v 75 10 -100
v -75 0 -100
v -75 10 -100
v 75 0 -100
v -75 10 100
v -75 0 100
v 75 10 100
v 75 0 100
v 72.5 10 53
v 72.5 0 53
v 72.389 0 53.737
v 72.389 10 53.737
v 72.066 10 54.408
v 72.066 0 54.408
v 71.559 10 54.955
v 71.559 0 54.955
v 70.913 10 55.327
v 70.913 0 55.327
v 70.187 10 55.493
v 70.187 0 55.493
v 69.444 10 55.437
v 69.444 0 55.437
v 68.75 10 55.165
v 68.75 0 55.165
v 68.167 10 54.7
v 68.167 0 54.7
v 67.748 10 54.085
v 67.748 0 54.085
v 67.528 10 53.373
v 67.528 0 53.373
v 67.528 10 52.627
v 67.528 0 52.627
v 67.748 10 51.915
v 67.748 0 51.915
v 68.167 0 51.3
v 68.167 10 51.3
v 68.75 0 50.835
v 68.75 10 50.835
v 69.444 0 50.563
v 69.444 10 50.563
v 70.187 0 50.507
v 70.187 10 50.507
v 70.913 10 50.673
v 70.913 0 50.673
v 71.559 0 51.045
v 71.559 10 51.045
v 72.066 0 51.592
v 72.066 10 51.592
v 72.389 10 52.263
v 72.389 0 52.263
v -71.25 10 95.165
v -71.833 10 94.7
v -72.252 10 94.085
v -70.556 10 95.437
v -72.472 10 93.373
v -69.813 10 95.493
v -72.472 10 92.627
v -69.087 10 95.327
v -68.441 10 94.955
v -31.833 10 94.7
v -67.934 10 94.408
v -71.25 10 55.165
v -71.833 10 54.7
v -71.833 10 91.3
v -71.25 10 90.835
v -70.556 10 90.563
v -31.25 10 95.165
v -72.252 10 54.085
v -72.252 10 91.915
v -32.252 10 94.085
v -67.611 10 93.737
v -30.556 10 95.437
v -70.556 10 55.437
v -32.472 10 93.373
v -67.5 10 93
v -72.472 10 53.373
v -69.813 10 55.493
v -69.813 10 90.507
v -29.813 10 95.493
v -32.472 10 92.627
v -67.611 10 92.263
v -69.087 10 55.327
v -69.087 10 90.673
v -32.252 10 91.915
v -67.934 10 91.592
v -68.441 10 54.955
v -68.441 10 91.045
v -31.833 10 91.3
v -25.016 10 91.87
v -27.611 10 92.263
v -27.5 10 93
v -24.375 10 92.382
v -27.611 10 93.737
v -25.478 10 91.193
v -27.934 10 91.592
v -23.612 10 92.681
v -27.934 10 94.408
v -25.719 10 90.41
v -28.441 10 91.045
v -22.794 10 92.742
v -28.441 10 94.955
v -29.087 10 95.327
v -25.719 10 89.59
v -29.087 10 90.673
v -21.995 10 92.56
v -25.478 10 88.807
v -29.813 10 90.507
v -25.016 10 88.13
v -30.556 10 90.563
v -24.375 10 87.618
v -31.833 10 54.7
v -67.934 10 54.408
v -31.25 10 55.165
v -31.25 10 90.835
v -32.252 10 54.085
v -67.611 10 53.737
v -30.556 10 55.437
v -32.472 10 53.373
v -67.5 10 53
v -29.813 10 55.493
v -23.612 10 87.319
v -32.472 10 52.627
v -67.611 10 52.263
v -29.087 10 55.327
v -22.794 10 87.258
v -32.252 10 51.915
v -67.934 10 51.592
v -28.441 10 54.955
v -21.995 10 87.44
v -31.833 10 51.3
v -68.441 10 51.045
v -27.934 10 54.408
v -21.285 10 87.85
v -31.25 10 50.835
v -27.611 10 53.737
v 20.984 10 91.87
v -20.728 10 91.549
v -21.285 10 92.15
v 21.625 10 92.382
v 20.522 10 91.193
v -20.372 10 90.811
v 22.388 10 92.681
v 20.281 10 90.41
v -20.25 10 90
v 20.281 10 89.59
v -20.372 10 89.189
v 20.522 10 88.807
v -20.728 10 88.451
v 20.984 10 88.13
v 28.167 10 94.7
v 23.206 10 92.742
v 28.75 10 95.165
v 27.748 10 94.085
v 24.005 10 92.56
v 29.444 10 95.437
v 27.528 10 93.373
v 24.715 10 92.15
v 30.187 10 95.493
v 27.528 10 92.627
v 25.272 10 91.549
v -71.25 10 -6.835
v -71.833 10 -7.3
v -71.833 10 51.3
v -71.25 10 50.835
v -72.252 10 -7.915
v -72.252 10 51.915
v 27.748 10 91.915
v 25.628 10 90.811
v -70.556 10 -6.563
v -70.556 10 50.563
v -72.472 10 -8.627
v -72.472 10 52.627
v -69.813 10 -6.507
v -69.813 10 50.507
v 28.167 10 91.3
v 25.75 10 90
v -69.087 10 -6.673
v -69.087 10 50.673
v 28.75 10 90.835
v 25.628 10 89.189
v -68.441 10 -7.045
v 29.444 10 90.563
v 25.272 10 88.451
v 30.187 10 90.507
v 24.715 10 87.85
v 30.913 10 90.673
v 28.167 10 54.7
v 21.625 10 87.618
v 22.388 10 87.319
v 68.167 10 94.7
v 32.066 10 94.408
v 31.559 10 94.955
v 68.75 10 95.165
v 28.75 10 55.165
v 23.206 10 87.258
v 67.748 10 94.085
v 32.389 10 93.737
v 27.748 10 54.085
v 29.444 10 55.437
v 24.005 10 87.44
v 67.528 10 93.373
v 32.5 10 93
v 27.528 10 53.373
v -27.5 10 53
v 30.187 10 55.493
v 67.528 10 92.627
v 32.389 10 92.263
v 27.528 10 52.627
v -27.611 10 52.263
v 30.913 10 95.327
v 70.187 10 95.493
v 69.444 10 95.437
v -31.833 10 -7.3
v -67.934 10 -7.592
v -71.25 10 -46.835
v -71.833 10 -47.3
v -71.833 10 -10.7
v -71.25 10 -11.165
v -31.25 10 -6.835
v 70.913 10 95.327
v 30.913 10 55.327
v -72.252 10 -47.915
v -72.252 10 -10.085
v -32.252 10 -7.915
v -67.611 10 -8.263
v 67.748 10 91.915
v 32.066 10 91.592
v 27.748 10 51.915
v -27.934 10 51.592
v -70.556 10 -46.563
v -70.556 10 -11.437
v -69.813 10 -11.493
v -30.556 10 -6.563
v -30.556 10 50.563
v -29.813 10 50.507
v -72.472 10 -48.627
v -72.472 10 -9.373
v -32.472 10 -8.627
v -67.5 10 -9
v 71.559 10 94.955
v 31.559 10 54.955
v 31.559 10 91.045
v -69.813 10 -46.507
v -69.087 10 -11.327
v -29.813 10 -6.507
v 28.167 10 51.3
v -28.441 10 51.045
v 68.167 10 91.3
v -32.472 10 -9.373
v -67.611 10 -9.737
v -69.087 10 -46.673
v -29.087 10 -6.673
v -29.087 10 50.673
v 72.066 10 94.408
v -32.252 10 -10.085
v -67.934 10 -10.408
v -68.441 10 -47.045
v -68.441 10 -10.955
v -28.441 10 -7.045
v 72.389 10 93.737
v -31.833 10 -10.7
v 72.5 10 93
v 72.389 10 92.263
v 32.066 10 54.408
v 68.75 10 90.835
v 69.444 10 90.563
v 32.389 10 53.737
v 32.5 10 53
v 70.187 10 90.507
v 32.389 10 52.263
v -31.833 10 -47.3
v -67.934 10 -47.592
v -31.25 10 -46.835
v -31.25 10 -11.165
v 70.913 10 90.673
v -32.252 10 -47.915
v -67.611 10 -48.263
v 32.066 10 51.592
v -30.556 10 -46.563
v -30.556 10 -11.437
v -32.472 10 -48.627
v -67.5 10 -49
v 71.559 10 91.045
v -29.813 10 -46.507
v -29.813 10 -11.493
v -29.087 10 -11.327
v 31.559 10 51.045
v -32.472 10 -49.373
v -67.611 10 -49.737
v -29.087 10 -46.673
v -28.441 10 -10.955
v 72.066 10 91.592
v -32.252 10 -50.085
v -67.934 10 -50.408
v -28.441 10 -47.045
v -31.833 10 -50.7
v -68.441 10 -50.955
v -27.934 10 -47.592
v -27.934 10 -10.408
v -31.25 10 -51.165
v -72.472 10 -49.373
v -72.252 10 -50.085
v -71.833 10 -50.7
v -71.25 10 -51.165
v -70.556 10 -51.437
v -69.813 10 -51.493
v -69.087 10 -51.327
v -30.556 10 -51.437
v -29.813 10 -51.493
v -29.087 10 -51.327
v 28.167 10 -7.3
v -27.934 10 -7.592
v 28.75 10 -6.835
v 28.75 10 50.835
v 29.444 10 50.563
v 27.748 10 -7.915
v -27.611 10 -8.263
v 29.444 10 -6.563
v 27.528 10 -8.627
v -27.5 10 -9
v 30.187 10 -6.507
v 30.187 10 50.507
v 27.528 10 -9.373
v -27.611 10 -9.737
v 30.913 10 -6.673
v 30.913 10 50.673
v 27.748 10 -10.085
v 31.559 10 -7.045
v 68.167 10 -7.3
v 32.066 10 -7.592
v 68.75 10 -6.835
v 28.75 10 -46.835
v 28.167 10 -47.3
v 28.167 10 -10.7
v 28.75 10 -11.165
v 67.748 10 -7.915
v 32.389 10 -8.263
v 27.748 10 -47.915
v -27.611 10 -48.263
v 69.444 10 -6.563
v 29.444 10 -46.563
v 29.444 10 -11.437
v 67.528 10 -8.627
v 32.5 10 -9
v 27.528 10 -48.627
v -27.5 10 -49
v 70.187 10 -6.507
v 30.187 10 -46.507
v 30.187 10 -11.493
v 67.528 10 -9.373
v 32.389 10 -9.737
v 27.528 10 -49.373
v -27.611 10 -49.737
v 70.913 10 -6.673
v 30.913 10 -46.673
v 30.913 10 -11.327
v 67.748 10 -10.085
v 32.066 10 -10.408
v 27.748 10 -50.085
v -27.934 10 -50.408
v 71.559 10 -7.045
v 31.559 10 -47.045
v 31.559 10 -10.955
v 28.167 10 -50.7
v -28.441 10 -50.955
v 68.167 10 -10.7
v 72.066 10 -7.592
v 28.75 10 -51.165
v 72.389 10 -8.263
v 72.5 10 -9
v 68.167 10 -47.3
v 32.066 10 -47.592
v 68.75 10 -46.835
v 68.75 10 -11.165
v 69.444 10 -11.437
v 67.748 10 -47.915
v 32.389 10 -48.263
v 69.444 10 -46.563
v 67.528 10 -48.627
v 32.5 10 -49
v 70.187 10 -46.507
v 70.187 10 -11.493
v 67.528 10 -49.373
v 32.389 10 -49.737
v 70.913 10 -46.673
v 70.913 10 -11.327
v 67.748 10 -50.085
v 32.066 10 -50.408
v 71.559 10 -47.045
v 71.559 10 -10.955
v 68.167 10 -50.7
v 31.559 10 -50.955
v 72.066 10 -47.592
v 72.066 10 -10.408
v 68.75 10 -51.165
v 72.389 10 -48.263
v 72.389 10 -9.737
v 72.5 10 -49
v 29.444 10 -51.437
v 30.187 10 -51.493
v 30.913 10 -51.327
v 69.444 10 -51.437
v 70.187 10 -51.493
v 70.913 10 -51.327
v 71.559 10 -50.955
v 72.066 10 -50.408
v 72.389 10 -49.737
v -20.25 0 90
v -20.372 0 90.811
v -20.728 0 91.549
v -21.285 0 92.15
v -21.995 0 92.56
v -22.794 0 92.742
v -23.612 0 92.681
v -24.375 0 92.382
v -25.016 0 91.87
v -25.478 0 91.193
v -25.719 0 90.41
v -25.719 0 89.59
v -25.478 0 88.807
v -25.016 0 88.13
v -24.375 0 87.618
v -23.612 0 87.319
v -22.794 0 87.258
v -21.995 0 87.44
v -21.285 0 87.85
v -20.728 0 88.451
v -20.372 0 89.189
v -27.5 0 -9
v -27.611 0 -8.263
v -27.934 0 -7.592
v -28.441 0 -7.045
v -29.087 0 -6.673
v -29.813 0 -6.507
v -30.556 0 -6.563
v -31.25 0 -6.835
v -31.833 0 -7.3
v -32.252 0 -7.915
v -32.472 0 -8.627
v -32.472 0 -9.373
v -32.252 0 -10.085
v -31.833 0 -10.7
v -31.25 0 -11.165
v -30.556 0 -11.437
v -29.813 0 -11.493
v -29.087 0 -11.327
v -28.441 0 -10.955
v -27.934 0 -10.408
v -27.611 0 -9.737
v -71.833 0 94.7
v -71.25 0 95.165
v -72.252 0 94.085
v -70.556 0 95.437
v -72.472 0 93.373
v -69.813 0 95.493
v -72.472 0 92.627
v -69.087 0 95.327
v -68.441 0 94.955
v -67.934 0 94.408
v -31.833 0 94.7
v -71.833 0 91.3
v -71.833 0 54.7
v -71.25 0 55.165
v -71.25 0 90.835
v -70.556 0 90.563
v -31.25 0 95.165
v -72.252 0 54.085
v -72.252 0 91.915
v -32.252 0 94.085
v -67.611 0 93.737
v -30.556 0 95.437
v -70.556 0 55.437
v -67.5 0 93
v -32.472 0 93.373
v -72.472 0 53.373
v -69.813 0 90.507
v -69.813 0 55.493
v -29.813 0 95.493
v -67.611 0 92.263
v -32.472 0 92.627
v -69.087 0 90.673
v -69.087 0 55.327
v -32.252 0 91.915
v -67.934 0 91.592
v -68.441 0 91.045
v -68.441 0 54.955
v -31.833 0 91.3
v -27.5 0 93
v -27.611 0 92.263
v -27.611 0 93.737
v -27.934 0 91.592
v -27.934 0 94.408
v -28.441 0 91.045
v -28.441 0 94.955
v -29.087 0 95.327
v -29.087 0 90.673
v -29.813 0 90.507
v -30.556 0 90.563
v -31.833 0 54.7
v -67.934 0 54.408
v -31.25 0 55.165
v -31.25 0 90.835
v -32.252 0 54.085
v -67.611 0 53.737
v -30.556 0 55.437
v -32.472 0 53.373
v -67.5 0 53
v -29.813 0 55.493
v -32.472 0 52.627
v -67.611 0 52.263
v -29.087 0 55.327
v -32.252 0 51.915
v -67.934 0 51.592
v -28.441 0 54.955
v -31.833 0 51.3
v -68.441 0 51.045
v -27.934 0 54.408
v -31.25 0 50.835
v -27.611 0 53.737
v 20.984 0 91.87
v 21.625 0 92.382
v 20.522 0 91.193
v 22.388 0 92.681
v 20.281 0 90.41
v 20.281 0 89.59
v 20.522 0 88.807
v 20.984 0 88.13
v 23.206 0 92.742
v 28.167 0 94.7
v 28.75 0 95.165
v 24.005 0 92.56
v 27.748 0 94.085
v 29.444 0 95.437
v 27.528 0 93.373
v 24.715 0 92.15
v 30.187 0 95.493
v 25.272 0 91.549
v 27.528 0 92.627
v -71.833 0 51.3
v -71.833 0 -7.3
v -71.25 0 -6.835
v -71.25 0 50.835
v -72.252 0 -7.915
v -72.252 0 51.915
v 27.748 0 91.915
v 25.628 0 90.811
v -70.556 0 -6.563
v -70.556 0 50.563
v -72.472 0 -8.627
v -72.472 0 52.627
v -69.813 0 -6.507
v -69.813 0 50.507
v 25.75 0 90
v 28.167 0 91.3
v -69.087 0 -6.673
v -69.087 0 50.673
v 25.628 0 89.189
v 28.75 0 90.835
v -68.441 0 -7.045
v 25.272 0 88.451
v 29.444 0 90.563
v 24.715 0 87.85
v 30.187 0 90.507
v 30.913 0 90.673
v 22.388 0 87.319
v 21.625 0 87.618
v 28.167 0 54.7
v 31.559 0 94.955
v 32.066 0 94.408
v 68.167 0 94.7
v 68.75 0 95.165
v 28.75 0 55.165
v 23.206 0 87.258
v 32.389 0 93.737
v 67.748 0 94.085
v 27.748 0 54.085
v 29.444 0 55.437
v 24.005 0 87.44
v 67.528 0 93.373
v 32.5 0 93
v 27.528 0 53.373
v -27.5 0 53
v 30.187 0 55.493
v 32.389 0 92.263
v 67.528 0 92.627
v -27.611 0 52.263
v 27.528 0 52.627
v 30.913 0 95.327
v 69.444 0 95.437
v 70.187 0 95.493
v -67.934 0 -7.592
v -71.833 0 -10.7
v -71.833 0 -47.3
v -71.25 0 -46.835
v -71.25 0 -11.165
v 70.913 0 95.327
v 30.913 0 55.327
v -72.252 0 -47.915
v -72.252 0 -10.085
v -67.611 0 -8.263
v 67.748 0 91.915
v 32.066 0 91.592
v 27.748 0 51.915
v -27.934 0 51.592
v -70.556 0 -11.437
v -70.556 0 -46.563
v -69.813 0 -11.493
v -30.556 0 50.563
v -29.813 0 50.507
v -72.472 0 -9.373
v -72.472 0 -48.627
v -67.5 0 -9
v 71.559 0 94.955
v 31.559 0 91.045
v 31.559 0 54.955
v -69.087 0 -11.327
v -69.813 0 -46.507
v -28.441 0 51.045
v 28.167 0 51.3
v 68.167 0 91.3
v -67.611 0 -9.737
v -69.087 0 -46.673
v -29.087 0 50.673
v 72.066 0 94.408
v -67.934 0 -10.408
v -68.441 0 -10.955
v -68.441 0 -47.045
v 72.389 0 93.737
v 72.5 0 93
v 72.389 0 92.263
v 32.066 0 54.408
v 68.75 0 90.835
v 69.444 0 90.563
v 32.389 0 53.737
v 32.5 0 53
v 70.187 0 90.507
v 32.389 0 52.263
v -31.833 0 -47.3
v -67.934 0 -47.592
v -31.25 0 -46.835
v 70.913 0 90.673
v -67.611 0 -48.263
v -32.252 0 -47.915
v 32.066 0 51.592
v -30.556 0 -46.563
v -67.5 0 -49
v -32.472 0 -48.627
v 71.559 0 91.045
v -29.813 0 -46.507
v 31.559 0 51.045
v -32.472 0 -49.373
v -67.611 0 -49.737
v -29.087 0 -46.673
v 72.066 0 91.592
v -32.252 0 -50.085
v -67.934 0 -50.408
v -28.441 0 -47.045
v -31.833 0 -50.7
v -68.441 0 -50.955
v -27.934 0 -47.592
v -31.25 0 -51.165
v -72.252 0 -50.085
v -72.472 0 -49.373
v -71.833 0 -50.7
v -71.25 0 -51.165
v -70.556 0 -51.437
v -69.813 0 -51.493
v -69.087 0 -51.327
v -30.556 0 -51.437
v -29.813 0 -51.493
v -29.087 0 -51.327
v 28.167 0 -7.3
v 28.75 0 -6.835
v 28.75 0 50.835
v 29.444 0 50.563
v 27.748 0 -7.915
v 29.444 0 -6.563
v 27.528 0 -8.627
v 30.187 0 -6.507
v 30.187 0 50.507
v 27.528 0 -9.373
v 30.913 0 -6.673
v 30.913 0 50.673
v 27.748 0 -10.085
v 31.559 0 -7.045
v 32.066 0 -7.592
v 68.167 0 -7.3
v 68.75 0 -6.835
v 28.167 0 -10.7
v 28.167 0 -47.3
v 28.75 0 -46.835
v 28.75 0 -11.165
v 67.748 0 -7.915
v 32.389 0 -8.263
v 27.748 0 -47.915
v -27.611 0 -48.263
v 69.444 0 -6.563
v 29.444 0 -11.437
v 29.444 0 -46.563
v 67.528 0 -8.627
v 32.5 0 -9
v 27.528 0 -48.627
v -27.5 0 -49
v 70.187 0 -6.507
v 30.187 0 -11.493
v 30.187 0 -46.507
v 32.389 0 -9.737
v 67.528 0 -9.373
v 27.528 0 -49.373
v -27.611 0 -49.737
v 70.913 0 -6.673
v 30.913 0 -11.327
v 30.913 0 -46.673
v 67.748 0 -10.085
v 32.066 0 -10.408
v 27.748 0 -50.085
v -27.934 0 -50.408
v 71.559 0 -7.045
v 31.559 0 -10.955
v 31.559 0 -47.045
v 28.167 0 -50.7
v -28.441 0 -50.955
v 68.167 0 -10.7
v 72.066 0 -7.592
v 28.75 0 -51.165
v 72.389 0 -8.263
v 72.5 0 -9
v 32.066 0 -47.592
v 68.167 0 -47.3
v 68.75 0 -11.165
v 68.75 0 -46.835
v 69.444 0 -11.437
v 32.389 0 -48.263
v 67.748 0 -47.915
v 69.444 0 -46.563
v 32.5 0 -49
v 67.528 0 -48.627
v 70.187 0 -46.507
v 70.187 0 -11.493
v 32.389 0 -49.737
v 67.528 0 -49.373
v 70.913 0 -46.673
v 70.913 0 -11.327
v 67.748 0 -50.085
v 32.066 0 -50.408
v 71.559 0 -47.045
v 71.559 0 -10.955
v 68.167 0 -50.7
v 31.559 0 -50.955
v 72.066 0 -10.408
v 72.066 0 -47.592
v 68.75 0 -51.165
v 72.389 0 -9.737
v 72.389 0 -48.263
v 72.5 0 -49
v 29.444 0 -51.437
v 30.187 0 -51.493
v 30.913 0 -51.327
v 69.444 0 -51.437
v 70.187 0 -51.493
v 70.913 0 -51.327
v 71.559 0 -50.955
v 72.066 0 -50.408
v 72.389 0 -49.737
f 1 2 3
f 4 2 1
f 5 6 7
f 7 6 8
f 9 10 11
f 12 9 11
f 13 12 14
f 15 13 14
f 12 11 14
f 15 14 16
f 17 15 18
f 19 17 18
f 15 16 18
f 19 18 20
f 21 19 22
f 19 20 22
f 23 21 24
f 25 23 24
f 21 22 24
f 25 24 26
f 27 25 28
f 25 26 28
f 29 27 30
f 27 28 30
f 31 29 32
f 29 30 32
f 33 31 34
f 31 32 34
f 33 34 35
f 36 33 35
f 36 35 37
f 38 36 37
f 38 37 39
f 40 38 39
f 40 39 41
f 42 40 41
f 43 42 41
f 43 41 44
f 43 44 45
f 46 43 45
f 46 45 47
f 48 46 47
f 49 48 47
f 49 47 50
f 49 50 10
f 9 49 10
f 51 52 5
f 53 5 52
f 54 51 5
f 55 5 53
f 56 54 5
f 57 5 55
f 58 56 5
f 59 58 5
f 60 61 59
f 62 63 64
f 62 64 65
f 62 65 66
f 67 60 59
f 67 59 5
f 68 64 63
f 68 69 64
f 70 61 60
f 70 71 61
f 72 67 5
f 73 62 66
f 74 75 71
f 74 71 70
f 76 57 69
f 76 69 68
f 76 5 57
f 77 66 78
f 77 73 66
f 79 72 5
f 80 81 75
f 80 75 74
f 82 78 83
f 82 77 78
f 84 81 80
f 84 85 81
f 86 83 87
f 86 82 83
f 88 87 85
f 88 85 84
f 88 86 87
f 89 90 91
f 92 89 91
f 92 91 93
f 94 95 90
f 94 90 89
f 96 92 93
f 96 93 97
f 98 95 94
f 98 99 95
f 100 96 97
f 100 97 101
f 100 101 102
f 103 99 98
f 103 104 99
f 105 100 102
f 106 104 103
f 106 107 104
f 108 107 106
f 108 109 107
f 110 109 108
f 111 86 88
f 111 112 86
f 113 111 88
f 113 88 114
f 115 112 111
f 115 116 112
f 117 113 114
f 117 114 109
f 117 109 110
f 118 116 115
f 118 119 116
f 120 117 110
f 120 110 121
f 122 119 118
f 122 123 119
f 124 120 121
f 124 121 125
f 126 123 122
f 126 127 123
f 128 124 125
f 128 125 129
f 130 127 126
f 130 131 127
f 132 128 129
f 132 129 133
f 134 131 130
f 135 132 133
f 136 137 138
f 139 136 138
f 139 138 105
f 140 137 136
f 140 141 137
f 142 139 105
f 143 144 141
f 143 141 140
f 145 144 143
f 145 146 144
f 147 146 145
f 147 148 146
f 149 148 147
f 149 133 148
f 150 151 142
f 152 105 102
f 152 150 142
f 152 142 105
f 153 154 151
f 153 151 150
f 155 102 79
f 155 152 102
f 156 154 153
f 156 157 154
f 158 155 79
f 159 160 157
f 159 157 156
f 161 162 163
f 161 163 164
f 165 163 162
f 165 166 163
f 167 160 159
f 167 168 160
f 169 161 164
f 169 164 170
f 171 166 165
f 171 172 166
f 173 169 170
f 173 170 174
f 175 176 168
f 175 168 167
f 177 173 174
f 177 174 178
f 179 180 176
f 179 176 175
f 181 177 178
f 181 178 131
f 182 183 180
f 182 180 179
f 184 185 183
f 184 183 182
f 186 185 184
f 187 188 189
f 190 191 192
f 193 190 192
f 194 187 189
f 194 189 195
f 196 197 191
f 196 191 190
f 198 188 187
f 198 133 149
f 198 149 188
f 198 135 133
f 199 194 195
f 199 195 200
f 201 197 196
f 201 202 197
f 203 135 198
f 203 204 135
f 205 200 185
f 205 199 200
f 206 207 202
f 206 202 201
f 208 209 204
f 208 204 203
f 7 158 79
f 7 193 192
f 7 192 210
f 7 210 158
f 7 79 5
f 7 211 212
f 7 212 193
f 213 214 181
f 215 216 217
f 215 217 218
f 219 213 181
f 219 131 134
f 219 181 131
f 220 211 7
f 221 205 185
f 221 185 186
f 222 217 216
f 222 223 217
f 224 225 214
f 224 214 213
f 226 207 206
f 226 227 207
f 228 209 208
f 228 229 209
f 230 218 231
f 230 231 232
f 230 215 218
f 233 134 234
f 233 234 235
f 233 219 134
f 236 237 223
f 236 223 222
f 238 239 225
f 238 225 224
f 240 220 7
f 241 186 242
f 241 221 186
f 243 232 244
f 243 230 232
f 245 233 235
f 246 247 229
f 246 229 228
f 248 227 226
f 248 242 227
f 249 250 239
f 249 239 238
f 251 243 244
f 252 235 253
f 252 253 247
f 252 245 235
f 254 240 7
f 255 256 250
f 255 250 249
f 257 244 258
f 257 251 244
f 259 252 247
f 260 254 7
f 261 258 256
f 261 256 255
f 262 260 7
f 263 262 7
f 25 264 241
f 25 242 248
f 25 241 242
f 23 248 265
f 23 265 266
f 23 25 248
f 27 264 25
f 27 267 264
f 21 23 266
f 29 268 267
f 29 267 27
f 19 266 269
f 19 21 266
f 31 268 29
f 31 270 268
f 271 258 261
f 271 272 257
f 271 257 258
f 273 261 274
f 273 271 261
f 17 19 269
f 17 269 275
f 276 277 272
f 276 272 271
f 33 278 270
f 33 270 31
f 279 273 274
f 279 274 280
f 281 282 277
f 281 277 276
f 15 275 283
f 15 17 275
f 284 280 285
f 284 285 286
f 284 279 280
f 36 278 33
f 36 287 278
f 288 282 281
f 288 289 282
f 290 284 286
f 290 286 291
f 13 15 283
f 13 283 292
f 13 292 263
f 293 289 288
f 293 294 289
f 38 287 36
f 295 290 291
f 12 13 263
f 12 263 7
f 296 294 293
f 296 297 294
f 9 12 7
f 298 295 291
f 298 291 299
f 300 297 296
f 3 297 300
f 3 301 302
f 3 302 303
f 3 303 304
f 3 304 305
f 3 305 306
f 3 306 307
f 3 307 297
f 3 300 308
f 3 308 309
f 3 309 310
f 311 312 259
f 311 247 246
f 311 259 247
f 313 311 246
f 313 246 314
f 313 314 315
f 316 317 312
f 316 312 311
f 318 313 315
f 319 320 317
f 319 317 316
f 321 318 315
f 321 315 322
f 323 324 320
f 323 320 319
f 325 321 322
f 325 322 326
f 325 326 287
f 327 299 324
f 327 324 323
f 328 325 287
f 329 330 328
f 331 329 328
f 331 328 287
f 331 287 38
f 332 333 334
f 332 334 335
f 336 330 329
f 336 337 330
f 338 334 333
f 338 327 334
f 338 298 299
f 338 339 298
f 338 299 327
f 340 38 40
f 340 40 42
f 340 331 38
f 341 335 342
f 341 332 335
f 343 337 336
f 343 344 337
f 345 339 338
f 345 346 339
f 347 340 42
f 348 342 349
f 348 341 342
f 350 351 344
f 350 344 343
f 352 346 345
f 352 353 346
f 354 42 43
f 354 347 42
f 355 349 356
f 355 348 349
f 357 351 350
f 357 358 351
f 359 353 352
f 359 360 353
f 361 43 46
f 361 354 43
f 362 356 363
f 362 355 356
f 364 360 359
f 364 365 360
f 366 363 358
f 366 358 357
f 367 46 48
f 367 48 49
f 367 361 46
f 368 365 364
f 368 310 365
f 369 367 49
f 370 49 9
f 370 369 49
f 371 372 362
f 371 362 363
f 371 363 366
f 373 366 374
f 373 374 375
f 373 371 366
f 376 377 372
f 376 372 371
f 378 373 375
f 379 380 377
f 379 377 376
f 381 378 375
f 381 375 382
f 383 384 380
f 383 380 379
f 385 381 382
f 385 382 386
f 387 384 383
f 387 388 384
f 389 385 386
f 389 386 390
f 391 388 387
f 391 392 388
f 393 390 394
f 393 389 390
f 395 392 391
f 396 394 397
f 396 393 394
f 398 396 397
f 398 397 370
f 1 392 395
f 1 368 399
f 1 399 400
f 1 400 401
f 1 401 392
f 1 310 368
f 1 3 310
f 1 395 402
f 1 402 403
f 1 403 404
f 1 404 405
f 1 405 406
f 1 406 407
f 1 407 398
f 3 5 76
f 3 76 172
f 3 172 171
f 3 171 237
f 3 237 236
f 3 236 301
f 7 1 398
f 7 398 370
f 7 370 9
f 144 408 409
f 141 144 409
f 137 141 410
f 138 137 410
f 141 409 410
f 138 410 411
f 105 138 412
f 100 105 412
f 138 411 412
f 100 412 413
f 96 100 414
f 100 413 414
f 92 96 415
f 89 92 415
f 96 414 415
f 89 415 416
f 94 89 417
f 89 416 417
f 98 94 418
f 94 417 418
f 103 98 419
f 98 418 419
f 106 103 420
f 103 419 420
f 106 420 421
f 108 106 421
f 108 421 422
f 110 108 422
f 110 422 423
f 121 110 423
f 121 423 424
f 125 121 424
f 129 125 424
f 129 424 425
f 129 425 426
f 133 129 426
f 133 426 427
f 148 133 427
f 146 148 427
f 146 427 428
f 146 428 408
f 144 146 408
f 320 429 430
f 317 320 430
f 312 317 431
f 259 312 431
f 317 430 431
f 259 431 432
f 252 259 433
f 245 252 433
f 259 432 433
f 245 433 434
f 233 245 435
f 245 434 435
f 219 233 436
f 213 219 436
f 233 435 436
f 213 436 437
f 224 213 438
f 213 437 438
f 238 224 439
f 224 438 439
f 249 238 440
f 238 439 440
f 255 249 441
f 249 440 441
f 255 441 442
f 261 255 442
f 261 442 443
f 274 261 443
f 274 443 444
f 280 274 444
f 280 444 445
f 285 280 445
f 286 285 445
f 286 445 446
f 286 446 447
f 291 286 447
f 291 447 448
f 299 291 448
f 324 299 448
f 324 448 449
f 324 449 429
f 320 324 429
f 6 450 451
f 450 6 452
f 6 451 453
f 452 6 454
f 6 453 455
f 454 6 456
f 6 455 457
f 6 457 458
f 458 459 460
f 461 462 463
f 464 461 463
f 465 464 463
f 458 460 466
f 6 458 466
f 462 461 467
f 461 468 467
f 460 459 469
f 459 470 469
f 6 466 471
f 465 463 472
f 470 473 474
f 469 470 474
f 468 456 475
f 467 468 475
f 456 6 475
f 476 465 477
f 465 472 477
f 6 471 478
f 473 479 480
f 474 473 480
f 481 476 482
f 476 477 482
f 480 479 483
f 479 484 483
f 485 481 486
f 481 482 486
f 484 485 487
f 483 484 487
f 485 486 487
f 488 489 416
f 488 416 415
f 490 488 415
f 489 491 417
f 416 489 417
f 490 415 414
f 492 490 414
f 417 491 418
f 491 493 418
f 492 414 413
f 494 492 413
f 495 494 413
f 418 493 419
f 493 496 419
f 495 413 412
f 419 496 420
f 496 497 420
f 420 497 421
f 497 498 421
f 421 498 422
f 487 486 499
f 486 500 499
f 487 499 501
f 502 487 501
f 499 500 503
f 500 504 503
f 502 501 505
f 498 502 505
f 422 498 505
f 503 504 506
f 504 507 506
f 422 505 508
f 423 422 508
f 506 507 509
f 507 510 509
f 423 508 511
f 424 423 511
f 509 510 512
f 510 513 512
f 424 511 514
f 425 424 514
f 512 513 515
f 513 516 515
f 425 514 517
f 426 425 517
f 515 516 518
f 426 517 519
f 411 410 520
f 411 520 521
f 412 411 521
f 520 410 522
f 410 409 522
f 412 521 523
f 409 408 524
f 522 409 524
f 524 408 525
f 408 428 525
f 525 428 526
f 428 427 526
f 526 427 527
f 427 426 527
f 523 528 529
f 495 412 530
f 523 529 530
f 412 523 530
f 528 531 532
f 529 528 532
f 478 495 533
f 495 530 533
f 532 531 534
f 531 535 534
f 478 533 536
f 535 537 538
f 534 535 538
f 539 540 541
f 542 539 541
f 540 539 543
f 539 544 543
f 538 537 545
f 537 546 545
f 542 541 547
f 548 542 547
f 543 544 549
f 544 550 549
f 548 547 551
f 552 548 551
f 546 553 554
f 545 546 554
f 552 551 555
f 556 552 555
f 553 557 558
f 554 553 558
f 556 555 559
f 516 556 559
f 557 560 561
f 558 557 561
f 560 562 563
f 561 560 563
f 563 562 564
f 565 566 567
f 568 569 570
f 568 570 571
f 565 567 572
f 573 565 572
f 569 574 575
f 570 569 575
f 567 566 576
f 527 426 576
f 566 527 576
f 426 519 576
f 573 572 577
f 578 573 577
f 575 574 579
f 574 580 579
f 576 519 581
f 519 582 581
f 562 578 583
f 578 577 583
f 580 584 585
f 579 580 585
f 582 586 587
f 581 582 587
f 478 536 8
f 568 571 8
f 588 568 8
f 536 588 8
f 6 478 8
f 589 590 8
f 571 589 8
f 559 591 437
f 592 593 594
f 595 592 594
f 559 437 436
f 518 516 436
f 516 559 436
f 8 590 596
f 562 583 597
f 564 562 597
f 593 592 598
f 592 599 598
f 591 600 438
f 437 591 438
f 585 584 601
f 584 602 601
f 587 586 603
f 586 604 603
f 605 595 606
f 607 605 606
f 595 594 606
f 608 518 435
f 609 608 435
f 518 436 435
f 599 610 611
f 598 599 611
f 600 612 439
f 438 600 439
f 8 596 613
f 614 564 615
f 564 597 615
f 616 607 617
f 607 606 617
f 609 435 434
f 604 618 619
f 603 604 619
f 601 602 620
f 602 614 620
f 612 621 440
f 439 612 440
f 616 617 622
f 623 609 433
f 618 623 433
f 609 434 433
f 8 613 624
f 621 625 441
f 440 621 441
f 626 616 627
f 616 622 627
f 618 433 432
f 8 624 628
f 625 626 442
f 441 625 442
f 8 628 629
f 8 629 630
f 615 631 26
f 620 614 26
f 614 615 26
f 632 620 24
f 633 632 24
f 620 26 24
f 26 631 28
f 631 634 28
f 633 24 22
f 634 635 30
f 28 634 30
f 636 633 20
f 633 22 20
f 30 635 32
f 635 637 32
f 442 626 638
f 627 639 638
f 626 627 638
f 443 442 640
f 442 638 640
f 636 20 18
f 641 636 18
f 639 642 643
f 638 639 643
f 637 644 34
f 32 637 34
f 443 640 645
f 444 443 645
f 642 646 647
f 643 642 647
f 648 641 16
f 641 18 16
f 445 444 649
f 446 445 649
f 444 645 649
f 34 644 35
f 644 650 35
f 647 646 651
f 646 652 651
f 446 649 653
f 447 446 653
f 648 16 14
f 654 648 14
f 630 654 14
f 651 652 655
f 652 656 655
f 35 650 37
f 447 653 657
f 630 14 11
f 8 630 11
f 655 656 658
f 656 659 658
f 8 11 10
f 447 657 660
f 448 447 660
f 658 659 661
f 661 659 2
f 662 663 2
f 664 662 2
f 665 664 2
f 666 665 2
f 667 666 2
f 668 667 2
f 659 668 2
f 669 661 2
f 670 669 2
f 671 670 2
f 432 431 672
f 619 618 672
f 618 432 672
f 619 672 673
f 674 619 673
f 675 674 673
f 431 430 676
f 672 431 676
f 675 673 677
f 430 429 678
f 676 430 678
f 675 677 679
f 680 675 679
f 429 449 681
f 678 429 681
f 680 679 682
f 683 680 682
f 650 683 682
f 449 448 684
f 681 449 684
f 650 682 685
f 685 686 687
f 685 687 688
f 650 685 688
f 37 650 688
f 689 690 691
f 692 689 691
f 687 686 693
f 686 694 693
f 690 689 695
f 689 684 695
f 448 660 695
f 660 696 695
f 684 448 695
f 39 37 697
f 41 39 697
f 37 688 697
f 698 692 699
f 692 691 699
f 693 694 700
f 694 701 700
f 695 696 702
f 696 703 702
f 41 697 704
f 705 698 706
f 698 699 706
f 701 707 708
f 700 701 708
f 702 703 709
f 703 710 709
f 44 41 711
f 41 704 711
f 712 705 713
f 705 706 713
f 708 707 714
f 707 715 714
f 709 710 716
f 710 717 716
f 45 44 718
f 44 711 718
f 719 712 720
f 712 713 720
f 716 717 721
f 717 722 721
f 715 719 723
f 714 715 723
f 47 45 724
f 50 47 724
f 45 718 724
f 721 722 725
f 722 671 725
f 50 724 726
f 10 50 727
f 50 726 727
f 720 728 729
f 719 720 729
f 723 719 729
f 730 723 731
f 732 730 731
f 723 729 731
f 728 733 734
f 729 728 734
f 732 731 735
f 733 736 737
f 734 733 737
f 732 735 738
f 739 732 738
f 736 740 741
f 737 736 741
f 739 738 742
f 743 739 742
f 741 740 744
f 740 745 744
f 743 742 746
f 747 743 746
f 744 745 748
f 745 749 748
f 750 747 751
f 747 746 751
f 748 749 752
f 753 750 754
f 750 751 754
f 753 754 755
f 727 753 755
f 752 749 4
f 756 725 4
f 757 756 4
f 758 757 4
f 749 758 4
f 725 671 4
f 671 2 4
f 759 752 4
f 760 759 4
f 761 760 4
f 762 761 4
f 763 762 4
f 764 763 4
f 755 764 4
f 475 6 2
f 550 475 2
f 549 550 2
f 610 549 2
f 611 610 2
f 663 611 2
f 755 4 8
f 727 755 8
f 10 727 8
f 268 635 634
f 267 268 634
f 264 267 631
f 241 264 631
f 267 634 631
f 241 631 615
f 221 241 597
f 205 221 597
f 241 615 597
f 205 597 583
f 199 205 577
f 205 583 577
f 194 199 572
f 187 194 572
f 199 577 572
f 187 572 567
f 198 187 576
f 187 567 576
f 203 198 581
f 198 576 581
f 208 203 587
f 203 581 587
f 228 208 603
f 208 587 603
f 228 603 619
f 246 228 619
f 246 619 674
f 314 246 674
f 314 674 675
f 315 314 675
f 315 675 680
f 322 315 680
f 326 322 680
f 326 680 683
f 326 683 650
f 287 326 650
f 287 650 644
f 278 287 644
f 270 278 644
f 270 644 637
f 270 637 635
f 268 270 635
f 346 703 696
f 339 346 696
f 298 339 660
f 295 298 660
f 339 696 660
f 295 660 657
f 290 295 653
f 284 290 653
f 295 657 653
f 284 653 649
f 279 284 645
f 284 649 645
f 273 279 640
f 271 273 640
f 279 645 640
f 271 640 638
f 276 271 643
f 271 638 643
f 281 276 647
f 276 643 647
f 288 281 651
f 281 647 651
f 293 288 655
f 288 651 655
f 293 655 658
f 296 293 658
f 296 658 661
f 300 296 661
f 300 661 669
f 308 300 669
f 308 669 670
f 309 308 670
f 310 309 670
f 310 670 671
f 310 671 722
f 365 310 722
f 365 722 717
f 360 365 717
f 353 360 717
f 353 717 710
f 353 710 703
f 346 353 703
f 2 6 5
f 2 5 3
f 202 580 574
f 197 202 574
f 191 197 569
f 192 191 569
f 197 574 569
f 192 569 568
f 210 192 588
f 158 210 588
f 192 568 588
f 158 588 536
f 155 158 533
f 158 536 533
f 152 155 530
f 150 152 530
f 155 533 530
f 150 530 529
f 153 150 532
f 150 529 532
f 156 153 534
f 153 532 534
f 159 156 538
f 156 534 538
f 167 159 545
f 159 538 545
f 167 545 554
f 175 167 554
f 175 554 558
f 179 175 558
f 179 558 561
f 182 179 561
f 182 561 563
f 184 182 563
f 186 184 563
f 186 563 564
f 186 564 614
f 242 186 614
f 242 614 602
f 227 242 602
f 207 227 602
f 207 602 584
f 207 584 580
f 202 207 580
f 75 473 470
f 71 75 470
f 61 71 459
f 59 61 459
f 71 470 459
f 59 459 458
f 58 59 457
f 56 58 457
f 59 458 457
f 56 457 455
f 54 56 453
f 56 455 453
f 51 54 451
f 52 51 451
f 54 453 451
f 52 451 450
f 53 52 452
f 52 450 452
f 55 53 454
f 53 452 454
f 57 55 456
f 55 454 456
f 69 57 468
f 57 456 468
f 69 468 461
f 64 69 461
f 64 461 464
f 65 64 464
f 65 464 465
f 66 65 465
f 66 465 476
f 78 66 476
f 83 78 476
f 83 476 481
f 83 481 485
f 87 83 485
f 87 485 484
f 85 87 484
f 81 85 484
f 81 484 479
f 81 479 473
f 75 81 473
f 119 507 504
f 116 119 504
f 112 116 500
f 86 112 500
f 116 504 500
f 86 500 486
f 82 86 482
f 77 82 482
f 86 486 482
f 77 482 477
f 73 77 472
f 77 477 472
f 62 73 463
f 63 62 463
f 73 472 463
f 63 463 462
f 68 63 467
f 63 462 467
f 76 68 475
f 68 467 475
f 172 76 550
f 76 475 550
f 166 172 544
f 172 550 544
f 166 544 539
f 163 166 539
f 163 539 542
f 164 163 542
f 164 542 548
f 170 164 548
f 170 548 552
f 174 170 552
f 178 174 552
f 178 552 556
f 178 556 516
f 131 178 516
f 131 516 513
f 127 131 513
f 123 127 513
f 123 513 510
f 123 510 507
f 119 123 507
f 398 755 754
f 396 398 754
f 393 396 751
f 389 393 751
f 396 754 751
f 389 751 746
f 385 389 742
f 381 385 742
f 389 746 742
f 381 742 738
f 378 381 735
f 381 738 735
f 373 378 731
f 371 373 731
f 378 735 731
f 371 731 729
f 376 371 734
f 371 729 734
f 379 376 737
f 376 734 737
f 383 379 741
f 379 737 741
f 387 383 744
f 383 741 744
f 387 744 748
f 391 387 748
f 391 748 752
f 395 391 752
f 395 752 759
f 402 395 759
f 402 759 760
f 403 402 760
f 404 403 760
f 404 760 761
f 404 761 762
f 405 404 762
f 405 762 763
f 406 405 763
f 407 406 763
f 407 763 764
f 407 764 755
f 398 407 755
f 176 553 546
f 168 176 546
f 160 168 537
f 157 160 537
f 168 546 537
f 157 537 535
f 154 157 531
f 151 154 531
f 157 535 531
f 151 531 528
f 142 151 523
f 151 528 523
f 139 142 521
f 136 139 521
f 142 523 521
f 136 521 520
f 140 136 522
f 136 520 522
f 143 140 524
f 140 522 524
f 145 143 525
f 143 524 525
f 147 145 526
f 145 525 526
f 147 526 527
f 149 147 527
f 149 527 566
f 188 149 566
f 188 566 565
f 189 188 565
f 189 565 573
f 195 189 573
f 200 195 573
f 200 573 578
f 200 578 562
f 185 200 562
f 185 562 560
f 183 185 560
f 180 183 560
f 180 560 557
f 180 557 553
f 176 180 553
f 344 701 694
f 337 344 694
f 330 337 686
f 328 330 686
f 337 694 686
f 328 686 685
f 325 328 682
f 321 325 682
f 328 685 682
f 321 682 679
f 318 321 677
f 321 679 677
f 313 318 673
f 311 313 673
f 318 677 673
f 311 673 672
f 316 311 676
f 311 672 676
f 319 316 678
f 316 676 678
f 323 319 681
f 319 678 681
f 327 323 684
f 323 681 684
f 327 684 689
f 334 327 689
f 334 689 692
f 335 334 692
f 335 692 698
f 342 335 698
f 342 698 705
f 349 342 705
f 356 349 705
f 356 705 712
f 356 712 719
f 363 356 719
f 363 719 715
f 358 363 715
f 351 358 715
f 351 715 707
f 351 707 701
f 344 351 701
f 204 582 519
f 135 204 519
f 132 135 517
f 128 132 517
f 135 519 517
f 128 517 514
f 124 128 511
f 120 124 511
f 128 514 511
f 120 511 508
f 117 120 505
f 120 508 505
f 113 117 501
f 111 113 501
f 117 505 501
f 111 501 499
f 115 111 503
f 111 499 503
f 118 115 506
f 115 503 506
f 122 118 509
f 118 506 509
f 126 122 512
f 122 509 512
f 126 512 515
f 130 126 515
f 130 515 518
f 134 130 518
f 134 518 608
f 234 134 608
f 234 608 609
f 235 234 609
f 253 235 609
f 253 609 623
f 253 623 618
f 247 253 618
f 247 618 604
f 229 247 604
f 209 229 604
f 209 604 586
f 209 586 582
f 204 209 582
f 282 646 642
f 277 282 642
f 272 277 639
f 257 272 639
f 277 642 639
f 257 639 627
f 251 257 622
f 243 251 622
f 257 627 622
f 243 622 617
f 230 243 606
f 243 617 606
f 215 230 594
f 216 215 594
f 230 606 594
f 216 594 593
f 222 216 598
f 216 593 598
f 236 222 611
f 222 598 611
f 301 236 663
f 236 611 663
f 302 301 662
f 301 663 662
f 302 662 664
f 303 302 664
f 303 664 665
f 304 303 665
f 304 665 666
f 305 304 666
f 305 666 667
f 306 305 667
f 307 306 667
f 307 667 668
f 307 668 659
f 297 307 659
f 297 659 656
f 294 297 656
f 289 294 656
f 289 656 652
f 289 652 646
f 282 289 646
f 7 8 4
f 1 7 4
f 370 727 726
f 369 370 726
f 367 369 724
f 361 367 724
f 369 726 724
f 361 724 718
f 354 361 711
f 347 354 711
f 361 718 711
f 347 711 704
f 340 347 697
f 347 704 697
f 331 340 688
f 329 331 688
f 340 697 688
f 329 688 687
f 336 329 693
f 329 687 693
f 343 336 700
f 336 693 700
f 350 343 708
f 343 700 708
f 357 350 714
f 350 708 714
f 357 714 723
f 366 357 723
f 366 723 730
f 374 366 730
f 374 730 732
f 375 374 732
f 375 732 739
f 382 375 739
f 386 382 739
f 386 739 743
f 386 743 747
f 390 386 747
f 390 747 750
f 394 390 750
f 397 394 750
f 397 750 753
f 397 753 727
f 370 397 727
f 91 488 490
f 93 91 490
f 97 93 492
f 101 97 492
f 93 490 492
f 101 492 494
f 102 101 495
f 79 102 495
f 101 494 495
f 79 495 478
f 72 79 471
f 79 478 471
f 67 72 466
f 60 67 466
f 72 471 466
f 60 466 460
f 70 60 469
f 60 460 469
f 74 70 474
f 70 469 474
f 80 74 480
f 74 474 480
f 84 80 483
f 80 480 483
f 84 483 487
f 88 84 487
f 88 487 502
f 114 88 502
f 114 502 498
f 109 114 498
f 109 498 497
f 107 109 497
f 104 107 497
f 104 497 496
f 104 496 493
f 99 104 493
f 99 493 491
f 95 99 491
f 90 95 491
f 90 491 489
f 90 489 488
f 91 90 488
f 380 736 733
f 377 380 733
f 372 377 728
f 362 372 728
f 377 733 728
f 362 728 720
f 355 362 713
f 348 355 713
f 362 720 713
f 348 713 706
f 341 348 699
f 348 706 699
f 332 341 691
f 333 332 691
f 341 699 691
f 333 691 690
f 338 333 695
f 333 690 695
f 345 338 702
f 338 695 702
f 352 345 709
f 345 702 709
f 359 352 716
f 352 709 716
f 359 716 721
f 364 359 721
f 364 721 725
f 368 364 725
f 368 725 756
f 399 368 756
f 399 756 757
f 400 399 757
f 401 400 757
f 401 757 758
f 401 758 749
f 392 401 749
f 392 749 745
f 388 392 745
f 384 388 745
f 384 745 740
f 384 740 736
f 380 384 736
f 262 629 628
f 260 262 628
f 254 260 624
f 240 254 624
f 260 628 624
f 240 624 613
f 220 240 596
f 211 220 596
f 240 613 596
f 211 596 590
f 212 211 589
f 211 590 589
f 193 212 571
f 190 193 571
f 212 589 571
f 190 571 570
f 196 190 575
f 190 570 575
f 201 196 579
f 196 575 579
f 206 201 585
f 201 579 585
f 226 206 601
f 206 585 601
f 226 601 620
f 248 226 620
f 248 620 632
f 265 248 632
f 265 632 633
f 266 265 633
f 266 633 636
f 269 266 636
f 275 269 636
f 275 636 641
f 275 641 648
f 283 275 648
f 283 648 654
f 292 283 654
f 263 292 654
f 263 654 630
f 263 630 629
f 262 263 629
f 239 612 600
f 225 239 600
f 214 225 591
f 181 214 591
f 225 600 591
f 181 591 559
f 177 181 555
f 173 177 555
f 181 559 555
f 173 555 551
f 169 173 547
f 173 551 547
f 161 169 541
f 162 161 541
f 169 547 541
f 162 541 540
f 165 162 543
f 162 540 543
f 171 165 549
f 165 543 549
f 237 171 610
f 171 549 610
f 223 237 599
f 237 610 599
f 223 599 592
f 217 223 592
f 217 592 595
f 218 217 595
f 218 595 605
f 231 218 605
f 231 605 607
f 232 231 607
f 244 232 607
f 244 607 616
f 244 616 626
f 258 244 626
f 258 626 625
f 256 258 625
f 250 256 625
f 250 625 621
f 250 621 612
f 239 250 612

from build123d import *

# Parameters (mm, degrees)
SKETCH1_W           = 150
SKETCH1_H           = 200
BOSS_EXTRUDE1_DEPTH = 10
SKETCH2_R           = 2.5
SKETCH2_R_2         = 2.75
CUT_EXTRUDE1_DEPTH  = 11


with BuildPart() as part:
    # Sketch1 → Boss-Extrude1 (new body)
    with BuildSketch(Plane(origin=(0, 0, 0), x_dir=(1, 0, 0), z_dir=(0, 1, 0))):
        Rectangle(SKETCH1_W, SKETCH1_H)
    extrude(amount=BOSS_EXTRUDE1_DEPTH)

    # Sketch2 → Cut-Extrude1 (cut, through all)
    with BuildSketch(Plane.XZ):
        with Locations((-70, 93)):
            Circle(SKETCH2_R)
        with Locations((-30, 93)):
            Circle(SKETCH2_R)
        with Locations((-30, 53)):
            Circle(SKETCH2_R)
        with Locations((-70, 53)):
            Circle(SKETCH2_R)
        with Locations((70, 53)):
            Circle(SKETCH2_R)
        with Locations((30, 53)):
            Circle(SKETCH2_R)
        with Locations((30, 93)):
            Circle(SKETCH2_R)
        with Locations((70, 93)):
            Circle(SKETCH2_R)
        with Locations((-70, -9)):
            Circle(SKETCH2_R)
        with Locations((-30, -9)):
            Circle(SKETCH2_R)
        with Locations((-30, -49)):
            Circle(SKETCH2_R)
        with Locations((-70, -49)):
            Circle(SKETCH2_R)
        with Locations((70, -49)):
            Circle(SKETCH2_R)
        with Locations((30, -49)):
            Circle(SKETCH2_R)
        with Locations((30, -9)):
            Circle(SKETCH2_R)
        with Locations((70, -9)):
            Circle(SKETCH2_R)
        with Locations((-23, 90)):
            Circle(SKETCH2_R_2)
        with Locations((23, 90)):
            Circle(SKETCH2_R_2)
    extrude(amount=-CUT_EXTRUDE1_DEPTH, mode=Mode.SUBTRACT)


solid = part.part
